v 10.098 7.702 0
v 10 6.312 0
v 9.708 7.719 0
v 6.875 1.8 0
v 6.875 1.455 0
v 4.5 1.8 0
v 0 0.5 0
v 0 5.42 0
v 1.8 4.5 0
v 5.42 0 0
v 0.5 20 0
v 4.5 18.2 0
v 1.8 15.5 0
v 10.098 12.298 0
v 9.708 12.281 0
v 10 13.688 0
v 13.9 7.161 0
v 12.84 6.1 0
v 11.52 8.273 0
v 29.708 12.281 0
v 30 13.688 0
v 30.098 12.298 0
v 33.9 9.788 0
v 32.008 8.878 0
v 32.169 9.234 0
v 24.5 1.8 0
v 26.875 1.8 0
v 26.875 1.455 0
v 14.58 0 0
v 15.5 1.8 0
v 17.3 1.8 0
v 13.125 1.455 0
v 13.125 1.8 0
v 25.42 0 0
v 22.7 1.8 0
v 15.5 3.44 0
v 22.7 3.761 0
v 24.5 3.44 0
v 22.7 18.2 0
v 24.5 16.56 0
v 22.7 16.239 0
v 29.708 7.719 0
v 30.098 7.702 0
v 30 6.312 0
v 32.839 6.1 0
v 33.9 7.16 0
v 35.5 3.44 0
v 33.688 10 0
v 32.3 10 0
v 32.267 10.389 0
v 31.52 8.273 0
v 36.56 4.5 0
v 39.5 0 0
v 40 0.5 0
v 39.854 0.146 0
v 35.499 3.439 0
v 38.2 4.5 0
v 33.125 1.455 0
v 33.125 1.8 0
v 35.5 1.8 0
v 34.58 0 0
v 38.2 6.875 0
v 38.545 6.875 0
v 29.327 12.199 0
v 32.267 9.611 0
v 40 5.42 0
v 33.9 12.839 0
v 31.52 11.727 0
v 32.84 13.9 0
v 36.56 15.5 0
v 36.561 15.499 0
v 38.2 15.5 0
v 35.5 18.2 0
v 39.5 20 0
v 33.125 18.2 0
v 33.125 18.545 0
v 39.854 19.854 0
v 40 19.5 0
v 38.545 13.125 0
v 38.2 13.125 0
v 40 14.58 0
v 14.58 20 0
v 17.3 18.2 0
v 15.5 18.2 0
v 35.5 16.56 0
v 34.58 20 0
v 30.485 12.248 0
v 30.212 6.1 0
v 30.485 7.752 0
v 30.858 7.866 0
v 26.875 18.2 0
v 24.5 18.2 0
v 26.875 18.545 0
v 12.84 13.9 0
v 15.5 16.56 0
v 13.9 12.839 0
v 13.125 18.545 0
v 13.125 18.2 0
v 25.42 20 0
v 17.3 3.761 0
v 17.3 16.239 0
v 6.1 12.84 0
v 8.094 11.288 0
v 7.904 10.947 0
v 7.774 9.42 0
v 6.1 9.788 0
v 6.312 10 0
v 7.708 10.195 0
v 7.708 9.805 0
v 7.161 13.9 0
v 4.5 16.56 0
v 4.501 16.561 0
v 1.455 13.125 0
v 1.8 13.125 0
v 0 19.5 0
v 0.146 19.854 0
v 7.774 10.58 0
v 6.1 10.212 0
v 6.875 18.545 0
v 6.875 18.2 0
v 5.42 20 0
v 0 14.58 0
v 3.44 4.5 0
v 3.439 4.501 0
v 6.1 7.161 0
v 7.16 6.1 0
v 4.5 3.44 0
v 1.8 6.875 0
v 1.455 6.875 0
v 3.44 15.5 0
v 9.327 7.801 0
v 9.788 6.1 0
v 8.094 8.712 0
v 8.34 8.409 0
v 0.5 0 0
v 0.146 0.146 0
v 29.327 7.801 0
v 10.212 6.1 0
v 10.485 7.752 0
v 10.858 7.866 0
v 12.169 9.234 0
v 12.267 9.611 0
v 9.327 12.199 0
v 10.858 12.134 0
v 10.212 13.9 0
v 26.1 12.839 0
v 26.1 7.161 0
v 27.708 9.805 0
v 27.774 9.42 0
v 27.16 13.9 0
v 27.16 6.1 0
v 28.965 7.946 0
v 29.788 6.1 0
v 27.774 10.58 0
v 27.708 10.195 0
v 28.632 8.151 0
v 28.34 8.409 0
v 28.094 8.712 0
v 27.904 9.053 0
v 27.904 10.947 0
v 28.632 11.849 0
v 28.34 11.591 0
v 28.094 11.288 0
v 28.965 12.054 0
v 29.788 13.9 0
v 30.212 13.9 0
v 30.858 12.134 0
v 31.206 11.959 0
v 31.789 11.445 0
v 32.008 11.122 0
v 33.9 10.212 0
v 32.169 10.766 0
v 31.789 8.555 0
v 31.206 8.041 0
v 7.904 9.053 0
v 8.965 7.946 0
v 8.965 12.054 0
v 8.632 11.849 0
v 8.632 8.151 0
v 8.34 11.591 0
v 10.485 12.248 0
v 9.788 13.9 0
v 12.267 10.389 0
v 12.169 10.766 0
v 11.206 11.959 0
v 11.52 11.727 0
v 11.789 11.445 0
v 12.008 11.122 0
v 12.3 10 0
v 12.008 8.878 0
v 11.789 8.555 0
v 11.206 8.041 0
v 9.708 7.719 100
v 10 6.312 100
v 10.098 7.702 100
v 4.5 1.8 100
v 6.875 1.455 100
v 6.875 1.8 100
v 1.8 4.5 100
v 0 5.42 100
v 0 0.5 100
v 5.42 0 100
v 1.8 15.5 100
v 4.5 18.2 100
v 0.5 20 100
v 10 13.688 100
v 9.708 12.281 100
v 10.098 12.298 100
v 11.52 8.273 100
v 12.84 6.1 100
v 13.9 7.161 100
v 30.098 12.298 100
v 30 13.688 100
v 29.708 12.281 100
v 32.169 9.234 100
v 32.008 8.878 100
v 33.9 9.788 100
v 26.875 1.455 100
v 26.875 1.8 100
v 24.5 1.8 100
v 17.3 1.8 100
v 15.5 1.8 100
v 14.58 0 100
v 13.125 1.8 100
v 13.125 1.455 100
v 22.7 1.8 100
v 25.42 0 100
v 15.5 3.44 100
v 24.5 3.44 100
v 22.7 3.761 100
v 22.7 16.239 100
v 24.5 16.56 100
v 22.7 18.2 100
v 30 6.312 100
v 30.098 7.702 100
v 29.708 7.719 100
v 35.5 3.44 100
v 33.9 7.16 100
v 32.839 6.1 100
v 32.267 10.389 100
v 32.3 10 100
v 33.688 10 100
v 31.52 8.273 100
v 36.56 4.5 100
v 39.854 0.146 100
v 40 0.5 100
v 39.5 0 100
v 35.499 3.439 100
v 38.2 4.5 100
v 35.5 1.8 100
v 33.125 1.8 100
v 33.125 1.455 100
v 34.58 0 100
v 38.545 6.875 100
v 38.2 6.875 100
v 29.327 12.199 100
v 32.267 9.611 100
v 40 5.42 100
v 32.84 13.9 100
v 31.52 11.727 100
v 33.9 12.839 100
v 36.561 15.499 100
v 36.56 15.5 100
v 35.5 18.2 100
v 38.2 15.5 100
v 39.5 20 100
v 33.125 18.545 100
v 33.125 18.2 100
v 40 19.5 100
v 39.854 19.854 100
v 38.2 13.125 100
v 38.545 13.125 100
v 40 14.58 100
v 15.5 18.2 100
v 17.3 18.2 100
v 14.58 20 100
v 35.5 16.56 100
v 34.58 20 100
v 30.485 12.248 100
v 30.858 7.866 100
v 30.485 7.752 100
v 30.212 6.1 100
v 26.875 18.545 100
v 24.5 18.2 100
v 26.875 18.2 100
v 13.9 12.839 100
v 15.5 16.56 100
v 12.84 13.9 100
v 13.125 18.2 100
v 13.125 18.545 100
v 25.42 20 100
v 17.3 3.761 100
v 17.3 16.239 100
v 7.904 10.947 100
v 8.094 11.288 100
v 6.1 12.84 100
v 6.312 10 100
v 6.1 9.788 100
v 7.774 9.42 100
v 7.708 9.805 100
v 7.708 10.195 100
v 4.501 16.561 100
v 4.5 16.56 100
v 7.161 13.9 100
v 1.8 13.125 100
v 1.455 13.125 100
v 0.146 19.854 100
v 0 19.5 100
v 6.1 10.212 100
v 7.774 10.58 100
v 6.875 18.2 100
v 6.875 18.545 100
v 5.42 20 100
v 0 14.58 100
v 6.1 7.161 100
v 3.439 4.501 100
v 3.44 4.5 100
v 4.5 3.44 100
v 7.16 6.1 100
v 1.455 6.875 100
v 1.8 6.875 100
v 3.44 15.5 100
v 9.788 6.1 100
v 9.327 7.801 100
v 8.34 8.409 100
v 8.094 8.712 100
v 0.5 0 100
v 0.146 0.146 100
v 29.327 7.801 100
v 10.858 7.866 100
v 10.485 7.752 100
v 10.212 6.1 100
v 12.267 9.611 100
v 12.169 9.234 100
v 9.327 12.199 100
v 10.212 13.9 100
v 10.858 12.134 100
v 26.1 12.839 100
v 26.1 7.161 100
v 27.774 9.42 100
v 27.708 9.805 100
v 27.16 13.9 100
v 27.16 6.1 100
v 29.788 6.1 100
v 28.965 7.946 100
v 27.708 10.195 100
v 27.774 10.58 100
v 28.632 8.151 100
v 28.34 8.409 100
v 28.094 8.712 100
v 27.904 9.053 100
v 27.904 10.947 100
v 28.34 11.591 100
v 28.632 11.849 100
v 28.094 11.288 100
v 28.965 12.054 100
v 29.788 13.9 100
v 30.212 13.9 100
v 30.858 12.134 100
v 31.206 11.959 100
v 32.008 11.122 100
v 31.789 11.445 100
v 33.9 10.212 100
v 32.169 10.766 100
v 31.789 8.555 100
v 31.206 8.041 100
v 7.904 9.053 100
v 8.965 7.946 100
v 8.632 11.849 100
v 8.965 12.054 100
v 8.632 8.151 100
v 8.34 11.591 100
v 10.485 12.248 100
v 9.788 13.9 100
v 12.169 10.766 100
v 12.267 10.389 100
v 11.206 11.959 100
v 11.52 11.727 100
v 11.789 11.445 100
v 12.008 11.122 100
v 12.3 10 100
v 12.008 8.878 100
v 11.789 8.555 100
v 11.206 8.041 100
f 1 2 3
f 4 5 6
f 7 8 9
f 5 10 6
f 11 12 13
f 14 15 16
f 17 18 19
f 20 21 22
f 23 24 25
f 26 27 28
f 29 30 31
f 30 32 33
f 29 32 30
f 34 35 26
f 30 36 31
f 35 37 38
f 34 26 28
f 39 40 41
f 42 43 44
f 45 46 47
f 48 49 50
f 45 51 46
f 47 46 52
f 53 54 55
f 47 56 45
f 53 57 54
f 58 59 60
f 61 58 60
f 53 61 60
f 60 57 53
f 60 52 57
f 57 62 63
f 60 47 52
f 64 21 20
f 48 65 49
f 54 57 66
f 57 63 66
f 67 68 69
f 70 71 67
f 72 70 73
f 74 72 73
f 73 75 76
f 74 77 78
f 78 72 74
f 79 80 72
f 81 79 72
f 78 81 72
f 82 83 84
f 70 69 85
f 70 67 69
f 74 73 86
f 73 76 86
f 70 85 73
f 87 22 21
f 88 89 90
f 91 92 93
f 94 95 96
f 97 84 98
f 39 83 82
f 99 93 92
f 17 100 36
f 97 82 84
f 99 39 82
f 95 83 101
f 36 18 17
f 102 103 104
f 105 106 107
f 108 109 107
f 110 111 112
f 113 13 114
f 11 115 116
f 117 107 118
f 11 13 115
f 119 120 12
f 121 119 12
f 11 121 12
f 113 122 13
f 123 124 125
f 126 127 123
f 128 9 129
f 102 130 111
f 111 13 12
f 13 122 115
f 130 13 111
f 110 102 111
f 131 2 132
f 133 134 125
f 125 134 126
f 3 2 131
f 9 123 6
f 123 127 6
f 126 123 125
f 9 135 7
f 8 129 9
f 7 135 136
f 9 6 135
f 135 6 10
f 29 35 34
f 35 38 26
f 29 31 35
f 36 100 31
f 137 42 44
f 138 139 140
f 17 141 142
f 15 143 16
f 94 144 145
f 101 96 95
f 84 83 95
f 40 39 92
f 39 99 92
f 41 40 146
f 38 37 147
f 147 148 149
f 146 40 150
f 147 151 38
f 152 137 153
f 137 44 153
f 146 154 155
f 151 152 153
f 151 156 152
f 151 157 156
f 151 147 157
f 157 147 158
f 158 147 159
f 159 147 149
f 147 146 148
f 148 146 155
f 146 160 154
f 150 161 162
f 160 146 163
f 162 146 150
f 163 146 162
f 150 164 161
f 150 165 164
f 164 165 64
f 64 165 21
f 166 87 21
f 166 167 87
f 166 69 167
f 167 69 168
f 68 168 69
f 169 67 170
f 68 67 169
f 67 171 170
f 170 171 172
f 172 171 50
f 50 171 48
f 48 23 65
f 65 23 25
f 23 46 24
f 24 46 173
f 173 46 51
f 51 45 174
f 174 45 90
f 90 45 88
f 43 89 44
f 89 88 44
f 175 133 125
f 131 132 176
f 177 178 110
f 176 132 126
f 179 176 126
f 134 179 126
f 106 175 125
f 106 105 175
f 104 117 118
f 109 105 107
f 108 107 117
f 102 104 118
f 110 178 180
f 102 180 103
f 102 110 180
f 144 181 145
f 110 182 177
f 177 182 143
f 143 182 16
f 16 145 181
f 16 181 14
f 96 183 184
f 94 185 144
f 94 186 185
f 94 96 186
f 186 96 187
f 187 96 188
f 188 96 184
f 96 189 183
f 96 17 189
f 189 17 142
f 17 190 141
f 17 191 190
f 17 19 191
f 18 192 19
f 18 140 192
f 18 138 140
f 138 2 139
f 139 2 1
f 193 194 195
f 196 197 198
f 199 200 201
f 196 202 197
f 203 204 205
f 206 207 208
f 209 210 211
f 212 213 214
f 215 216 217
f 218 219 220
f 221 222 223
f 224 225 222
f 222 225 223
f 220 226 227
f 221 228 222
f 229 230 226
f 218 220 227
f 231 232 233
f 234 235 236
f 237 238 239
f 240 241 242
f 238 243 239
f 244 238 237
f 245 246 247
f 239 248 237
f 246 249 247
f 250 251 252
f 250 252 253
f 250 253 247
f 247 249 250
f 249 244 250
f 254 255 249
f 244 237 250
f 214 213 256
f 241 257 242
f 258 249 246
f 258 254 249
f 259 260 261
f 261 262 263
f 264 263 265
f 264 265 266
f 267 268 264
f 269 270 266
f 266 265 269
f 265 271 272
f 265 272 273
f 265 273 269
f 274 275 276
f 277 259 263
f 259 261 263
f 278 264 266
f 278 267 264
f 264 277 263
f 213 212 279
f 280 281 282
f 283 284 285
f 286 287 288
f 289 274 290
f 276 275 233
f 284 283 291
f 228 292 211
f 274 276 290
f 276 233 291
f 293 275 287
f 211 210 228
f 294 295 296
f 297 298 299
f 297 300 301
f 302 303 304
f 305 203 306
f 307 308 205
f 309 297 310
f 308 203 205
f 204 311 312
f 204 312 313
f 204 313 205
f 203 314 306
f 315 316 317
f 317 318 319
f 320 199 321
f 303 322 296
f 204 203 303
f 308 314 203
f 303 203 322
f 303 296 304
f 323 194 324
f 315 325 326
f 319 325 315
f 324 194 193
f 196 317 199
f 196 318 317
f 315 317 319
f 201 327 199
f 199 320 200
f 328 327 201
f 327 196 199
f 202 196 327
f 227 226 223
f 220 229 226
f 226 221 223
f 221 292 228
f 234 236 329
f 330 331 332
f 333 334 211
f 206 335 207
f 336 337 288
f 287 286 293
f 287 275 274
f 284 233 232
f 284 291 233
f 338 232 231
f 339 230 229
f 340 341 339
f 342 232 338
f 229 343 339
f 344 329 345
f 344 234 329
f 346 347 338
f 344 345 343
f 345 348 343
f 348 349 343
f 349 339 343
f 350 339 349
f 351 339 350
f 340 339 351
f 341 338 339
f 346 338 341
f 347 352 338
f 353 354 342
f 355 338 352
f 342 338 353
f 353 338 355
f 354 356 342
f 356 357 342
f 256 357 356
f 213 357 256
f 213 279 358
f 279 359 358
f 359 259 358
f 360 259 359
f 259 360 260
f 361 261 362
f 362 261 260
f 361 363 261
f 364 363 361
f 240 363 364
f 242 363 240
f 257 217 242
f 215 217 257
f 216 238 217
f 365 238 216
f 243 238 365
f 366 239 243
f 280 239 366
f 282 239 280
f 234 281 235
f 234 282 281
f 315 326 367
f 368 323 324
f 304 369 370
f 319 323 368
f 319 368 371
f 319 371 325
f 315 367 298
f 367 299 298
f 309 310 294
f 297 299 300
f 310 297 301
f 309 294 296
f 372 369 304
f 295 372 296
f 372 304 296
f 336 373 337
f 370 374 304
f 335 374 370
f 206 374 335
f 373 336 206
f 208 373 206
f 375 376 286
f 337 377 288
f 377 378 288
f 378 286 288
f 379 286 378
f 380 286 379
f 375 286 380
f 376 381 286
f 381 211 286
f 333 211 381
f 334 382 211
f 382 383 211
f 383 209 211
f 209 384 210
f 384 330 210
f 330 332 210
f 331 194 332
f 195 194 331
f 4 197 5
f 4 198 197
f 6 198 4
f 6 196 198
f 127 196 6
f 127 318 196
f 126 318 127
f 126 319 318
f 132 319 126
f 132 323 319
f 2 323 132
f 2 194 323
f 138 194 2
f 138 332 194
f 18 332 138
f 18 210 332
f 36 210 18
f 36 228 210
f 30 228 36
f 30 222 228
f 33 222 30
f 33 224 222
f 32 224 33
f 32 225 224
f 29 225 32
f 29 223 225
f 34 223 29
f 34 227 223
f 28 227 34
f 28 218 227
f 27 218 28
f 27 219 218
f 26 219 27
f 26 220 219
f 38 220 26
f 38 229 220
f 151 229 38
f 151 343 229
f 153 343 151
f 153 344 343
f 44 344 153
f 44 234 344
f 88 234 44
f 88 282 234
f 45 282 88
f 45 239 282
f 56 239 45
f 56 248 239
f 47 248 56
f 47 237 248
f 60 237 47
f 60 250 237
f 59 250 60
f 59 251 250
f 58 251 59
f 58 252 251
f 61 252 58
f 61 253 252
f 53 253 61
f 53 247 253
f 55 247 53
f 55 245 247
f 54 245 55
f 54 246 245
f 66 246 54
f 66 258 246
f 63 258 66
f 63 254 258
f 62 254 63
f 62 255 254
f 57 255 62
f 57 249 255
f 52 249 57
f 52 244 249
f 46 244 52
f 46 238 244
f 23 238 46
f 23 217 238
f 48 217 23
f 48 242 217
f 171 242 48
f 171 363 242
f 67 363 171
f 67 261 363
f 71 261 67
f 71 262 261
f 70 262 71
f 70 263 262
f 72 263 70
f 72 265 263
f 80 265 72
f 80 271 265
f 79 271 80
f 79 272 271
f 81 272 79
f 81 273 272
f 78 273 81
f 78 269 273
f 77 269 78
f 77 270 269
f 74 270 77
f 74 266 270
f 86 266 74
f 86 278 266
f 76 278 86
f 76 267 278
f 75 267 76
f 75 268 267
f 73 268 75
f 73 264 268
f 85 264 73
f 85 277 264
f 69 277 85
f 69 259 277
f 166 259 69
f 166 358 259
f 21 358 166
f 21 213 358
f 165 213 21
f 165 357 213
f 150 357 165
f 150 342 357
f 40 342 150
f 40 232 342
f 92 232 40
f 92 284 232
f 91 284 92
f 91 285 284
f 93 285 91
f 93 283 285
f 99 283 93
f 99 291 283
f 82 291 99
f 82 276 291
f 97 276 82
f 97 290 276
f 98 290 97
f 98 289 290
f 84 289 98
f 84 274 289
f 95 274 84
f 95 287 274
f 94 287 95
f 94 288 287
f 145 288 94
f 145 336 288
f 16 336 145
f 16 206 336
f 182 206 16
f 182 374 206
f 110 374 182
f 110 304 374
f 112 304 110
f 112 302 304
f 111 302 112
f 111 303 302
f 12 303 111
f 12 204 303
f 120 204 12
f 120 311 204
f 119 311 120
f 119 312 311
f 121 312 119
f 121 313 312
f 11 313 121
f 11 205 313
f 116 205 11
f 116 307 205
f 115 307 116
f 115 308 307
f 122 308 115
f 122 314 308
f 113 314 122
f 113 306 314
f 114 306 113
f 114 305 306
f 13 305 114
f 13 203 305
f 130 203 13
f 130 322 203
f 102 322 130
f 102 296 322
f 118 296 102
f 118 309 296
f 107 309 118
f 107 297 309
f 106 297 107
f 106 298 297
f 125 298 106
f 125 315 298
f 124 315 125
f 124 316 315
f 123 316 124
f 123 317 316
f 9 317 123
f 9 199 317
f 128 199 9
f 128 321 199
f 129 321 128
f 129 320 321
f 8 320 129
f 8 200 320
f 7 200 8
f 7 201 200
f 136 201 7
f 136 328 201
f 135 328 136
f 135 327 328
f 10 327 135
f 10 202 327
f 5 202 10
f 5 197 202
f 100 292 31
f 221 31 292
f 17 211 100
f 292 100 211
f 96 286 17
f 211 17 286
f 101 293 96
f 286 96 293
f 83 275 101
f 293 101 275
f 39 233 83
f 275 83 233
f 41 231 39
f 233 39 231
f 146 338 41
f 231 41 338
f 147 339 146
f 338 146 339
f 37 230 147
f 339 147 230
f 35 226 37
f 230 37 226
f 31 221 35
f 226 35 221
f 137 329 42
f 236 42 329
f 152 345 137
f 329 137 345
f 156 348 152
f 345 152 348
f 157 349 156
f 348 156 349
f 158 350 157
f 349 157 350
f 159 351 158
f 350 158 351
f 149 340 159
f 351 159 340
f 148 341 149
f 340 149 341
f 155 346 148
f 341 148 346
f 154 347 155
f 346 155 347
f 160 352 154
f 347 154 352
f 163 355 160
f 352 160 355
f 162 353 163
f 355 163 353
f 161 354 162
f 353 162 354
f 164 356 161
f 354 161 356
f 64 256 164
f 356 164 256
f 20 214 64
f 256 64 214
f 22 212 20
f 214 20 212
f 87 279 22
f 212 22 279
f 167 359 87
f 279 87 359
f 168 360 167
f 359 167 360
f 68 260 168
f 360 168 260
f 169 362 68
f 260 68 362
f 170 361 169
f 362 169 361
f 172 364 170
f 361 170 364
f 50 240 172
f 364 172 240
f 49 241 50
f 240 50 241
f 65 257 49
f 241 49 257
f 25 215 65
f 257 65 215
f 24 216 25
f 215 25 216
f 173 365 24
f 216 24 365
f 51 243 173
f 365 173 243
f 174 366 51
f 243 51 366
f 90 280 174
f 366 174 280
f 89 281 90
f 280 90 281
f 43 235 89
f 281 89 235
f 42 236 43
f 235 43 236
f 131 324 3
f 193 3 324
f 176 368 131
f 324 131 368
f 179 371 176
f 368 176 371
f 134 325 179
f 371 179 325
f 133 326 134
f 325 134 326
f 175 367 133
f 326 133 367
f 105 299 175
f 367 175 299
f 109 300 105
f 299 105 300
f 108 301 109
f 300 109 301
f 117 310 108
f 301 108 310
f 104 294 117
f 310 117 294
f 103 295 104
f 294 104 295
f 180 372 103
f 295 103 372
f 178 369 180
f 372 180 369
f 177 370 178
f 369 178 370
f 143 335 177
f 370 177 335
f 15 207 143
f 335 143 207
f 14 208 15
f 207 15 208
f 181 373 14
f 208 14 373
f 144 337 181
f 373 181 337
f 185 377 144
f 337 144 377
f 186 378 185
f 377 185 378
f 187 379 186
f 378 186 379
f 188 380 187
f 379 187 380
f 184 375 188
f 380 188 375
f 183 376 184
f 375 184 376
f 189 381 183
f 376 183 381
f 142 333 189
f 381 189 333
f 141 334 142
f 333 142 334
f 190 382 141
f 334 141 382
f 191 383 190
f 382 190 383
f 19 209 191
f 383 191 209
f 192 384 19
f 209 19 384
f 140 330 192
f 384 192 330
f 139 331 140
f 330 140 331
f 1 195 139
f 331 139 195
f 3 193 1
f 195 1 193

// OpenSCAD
$fa = 1.0;
$fs = 0.4;

module center(l=1,r=1,t=1,b=1){
    difference(){
        translate([-3.9,-3.9,0]) square(7.8);
        circle(r=2.3);
        if(t==1) {translate([0,3.688,0]) rotate([0,0,45]) square(0.3);}
        if(b==1) {translate([0,-4.112,0]) rotate([0,0,45]) square(0.3);}
        if(r==1) {translate([3.9,-0.212,0]) rotate([0,0,45]) square(0.3);}
        if(l==1) {translate([-3.9,-0.212,0]) rotate([0,0,45]) square(0.3);}
   }
}
 
module corner(){
    translate([0.5,0.5,0]) circle(r=0.5);
    hull(){
        translate([0.5,0,0]) square([4.92,1.8]);
        translate([0.5,1.455,0]) square([6.375,0.345]);
    }
    hull(){
        translate([0,0.5,0]) square([1.8,4.92]);
        translate([1.455,0.5,0]) square([0.345,6.375]);
    }
    translate([1.8,1.8,0]) square(2.7);
    translate([4.5,3.44,0]) rotate([0,0,45]) square([3.763,1.5]);
}

module mids(){
    hull(){
        translate([-5.42,0,0]) square([10.84,1.8]);
        translate([-6.875,1.455,0]) square([13.75,0.345]);
    }
    translate([2.7,1.8,0]) square([1.8,1.961]);
    translate([-4.5,1.8,0]) square([1.8,1.961]);
    translate([2.7,3.761,0]) rotate([0,0,-45]) square([1.5,4.808]);
    translate([-2.7,3.761,0]) rotate([0,0,45]) translate([-1.5,0,0]) square([1.5,4.808]);
}
 
module vslot2040(){
   corner();
   translate([40,0,0]) rotate([0,0,90]) corner();
   translate([40,20,0]) rotate([0,0,180]) corner();
   translate([0,20,0]) rotate([0,0,270]) corner();
   translate([20,0,0]) mids();
   translate([20,20]) rotate([0,0,180]) mids();
   translate([10,10,0]) center(l=1,r=0,t=1,b=1);
   translate([30,10,0]) center(l=0,r=1,t=1,b=1);
}
 
 // linear extrude height is desired length of v-slot
 color("slategray"){
     linear_extrude(height=100) vslot2040();
 }
